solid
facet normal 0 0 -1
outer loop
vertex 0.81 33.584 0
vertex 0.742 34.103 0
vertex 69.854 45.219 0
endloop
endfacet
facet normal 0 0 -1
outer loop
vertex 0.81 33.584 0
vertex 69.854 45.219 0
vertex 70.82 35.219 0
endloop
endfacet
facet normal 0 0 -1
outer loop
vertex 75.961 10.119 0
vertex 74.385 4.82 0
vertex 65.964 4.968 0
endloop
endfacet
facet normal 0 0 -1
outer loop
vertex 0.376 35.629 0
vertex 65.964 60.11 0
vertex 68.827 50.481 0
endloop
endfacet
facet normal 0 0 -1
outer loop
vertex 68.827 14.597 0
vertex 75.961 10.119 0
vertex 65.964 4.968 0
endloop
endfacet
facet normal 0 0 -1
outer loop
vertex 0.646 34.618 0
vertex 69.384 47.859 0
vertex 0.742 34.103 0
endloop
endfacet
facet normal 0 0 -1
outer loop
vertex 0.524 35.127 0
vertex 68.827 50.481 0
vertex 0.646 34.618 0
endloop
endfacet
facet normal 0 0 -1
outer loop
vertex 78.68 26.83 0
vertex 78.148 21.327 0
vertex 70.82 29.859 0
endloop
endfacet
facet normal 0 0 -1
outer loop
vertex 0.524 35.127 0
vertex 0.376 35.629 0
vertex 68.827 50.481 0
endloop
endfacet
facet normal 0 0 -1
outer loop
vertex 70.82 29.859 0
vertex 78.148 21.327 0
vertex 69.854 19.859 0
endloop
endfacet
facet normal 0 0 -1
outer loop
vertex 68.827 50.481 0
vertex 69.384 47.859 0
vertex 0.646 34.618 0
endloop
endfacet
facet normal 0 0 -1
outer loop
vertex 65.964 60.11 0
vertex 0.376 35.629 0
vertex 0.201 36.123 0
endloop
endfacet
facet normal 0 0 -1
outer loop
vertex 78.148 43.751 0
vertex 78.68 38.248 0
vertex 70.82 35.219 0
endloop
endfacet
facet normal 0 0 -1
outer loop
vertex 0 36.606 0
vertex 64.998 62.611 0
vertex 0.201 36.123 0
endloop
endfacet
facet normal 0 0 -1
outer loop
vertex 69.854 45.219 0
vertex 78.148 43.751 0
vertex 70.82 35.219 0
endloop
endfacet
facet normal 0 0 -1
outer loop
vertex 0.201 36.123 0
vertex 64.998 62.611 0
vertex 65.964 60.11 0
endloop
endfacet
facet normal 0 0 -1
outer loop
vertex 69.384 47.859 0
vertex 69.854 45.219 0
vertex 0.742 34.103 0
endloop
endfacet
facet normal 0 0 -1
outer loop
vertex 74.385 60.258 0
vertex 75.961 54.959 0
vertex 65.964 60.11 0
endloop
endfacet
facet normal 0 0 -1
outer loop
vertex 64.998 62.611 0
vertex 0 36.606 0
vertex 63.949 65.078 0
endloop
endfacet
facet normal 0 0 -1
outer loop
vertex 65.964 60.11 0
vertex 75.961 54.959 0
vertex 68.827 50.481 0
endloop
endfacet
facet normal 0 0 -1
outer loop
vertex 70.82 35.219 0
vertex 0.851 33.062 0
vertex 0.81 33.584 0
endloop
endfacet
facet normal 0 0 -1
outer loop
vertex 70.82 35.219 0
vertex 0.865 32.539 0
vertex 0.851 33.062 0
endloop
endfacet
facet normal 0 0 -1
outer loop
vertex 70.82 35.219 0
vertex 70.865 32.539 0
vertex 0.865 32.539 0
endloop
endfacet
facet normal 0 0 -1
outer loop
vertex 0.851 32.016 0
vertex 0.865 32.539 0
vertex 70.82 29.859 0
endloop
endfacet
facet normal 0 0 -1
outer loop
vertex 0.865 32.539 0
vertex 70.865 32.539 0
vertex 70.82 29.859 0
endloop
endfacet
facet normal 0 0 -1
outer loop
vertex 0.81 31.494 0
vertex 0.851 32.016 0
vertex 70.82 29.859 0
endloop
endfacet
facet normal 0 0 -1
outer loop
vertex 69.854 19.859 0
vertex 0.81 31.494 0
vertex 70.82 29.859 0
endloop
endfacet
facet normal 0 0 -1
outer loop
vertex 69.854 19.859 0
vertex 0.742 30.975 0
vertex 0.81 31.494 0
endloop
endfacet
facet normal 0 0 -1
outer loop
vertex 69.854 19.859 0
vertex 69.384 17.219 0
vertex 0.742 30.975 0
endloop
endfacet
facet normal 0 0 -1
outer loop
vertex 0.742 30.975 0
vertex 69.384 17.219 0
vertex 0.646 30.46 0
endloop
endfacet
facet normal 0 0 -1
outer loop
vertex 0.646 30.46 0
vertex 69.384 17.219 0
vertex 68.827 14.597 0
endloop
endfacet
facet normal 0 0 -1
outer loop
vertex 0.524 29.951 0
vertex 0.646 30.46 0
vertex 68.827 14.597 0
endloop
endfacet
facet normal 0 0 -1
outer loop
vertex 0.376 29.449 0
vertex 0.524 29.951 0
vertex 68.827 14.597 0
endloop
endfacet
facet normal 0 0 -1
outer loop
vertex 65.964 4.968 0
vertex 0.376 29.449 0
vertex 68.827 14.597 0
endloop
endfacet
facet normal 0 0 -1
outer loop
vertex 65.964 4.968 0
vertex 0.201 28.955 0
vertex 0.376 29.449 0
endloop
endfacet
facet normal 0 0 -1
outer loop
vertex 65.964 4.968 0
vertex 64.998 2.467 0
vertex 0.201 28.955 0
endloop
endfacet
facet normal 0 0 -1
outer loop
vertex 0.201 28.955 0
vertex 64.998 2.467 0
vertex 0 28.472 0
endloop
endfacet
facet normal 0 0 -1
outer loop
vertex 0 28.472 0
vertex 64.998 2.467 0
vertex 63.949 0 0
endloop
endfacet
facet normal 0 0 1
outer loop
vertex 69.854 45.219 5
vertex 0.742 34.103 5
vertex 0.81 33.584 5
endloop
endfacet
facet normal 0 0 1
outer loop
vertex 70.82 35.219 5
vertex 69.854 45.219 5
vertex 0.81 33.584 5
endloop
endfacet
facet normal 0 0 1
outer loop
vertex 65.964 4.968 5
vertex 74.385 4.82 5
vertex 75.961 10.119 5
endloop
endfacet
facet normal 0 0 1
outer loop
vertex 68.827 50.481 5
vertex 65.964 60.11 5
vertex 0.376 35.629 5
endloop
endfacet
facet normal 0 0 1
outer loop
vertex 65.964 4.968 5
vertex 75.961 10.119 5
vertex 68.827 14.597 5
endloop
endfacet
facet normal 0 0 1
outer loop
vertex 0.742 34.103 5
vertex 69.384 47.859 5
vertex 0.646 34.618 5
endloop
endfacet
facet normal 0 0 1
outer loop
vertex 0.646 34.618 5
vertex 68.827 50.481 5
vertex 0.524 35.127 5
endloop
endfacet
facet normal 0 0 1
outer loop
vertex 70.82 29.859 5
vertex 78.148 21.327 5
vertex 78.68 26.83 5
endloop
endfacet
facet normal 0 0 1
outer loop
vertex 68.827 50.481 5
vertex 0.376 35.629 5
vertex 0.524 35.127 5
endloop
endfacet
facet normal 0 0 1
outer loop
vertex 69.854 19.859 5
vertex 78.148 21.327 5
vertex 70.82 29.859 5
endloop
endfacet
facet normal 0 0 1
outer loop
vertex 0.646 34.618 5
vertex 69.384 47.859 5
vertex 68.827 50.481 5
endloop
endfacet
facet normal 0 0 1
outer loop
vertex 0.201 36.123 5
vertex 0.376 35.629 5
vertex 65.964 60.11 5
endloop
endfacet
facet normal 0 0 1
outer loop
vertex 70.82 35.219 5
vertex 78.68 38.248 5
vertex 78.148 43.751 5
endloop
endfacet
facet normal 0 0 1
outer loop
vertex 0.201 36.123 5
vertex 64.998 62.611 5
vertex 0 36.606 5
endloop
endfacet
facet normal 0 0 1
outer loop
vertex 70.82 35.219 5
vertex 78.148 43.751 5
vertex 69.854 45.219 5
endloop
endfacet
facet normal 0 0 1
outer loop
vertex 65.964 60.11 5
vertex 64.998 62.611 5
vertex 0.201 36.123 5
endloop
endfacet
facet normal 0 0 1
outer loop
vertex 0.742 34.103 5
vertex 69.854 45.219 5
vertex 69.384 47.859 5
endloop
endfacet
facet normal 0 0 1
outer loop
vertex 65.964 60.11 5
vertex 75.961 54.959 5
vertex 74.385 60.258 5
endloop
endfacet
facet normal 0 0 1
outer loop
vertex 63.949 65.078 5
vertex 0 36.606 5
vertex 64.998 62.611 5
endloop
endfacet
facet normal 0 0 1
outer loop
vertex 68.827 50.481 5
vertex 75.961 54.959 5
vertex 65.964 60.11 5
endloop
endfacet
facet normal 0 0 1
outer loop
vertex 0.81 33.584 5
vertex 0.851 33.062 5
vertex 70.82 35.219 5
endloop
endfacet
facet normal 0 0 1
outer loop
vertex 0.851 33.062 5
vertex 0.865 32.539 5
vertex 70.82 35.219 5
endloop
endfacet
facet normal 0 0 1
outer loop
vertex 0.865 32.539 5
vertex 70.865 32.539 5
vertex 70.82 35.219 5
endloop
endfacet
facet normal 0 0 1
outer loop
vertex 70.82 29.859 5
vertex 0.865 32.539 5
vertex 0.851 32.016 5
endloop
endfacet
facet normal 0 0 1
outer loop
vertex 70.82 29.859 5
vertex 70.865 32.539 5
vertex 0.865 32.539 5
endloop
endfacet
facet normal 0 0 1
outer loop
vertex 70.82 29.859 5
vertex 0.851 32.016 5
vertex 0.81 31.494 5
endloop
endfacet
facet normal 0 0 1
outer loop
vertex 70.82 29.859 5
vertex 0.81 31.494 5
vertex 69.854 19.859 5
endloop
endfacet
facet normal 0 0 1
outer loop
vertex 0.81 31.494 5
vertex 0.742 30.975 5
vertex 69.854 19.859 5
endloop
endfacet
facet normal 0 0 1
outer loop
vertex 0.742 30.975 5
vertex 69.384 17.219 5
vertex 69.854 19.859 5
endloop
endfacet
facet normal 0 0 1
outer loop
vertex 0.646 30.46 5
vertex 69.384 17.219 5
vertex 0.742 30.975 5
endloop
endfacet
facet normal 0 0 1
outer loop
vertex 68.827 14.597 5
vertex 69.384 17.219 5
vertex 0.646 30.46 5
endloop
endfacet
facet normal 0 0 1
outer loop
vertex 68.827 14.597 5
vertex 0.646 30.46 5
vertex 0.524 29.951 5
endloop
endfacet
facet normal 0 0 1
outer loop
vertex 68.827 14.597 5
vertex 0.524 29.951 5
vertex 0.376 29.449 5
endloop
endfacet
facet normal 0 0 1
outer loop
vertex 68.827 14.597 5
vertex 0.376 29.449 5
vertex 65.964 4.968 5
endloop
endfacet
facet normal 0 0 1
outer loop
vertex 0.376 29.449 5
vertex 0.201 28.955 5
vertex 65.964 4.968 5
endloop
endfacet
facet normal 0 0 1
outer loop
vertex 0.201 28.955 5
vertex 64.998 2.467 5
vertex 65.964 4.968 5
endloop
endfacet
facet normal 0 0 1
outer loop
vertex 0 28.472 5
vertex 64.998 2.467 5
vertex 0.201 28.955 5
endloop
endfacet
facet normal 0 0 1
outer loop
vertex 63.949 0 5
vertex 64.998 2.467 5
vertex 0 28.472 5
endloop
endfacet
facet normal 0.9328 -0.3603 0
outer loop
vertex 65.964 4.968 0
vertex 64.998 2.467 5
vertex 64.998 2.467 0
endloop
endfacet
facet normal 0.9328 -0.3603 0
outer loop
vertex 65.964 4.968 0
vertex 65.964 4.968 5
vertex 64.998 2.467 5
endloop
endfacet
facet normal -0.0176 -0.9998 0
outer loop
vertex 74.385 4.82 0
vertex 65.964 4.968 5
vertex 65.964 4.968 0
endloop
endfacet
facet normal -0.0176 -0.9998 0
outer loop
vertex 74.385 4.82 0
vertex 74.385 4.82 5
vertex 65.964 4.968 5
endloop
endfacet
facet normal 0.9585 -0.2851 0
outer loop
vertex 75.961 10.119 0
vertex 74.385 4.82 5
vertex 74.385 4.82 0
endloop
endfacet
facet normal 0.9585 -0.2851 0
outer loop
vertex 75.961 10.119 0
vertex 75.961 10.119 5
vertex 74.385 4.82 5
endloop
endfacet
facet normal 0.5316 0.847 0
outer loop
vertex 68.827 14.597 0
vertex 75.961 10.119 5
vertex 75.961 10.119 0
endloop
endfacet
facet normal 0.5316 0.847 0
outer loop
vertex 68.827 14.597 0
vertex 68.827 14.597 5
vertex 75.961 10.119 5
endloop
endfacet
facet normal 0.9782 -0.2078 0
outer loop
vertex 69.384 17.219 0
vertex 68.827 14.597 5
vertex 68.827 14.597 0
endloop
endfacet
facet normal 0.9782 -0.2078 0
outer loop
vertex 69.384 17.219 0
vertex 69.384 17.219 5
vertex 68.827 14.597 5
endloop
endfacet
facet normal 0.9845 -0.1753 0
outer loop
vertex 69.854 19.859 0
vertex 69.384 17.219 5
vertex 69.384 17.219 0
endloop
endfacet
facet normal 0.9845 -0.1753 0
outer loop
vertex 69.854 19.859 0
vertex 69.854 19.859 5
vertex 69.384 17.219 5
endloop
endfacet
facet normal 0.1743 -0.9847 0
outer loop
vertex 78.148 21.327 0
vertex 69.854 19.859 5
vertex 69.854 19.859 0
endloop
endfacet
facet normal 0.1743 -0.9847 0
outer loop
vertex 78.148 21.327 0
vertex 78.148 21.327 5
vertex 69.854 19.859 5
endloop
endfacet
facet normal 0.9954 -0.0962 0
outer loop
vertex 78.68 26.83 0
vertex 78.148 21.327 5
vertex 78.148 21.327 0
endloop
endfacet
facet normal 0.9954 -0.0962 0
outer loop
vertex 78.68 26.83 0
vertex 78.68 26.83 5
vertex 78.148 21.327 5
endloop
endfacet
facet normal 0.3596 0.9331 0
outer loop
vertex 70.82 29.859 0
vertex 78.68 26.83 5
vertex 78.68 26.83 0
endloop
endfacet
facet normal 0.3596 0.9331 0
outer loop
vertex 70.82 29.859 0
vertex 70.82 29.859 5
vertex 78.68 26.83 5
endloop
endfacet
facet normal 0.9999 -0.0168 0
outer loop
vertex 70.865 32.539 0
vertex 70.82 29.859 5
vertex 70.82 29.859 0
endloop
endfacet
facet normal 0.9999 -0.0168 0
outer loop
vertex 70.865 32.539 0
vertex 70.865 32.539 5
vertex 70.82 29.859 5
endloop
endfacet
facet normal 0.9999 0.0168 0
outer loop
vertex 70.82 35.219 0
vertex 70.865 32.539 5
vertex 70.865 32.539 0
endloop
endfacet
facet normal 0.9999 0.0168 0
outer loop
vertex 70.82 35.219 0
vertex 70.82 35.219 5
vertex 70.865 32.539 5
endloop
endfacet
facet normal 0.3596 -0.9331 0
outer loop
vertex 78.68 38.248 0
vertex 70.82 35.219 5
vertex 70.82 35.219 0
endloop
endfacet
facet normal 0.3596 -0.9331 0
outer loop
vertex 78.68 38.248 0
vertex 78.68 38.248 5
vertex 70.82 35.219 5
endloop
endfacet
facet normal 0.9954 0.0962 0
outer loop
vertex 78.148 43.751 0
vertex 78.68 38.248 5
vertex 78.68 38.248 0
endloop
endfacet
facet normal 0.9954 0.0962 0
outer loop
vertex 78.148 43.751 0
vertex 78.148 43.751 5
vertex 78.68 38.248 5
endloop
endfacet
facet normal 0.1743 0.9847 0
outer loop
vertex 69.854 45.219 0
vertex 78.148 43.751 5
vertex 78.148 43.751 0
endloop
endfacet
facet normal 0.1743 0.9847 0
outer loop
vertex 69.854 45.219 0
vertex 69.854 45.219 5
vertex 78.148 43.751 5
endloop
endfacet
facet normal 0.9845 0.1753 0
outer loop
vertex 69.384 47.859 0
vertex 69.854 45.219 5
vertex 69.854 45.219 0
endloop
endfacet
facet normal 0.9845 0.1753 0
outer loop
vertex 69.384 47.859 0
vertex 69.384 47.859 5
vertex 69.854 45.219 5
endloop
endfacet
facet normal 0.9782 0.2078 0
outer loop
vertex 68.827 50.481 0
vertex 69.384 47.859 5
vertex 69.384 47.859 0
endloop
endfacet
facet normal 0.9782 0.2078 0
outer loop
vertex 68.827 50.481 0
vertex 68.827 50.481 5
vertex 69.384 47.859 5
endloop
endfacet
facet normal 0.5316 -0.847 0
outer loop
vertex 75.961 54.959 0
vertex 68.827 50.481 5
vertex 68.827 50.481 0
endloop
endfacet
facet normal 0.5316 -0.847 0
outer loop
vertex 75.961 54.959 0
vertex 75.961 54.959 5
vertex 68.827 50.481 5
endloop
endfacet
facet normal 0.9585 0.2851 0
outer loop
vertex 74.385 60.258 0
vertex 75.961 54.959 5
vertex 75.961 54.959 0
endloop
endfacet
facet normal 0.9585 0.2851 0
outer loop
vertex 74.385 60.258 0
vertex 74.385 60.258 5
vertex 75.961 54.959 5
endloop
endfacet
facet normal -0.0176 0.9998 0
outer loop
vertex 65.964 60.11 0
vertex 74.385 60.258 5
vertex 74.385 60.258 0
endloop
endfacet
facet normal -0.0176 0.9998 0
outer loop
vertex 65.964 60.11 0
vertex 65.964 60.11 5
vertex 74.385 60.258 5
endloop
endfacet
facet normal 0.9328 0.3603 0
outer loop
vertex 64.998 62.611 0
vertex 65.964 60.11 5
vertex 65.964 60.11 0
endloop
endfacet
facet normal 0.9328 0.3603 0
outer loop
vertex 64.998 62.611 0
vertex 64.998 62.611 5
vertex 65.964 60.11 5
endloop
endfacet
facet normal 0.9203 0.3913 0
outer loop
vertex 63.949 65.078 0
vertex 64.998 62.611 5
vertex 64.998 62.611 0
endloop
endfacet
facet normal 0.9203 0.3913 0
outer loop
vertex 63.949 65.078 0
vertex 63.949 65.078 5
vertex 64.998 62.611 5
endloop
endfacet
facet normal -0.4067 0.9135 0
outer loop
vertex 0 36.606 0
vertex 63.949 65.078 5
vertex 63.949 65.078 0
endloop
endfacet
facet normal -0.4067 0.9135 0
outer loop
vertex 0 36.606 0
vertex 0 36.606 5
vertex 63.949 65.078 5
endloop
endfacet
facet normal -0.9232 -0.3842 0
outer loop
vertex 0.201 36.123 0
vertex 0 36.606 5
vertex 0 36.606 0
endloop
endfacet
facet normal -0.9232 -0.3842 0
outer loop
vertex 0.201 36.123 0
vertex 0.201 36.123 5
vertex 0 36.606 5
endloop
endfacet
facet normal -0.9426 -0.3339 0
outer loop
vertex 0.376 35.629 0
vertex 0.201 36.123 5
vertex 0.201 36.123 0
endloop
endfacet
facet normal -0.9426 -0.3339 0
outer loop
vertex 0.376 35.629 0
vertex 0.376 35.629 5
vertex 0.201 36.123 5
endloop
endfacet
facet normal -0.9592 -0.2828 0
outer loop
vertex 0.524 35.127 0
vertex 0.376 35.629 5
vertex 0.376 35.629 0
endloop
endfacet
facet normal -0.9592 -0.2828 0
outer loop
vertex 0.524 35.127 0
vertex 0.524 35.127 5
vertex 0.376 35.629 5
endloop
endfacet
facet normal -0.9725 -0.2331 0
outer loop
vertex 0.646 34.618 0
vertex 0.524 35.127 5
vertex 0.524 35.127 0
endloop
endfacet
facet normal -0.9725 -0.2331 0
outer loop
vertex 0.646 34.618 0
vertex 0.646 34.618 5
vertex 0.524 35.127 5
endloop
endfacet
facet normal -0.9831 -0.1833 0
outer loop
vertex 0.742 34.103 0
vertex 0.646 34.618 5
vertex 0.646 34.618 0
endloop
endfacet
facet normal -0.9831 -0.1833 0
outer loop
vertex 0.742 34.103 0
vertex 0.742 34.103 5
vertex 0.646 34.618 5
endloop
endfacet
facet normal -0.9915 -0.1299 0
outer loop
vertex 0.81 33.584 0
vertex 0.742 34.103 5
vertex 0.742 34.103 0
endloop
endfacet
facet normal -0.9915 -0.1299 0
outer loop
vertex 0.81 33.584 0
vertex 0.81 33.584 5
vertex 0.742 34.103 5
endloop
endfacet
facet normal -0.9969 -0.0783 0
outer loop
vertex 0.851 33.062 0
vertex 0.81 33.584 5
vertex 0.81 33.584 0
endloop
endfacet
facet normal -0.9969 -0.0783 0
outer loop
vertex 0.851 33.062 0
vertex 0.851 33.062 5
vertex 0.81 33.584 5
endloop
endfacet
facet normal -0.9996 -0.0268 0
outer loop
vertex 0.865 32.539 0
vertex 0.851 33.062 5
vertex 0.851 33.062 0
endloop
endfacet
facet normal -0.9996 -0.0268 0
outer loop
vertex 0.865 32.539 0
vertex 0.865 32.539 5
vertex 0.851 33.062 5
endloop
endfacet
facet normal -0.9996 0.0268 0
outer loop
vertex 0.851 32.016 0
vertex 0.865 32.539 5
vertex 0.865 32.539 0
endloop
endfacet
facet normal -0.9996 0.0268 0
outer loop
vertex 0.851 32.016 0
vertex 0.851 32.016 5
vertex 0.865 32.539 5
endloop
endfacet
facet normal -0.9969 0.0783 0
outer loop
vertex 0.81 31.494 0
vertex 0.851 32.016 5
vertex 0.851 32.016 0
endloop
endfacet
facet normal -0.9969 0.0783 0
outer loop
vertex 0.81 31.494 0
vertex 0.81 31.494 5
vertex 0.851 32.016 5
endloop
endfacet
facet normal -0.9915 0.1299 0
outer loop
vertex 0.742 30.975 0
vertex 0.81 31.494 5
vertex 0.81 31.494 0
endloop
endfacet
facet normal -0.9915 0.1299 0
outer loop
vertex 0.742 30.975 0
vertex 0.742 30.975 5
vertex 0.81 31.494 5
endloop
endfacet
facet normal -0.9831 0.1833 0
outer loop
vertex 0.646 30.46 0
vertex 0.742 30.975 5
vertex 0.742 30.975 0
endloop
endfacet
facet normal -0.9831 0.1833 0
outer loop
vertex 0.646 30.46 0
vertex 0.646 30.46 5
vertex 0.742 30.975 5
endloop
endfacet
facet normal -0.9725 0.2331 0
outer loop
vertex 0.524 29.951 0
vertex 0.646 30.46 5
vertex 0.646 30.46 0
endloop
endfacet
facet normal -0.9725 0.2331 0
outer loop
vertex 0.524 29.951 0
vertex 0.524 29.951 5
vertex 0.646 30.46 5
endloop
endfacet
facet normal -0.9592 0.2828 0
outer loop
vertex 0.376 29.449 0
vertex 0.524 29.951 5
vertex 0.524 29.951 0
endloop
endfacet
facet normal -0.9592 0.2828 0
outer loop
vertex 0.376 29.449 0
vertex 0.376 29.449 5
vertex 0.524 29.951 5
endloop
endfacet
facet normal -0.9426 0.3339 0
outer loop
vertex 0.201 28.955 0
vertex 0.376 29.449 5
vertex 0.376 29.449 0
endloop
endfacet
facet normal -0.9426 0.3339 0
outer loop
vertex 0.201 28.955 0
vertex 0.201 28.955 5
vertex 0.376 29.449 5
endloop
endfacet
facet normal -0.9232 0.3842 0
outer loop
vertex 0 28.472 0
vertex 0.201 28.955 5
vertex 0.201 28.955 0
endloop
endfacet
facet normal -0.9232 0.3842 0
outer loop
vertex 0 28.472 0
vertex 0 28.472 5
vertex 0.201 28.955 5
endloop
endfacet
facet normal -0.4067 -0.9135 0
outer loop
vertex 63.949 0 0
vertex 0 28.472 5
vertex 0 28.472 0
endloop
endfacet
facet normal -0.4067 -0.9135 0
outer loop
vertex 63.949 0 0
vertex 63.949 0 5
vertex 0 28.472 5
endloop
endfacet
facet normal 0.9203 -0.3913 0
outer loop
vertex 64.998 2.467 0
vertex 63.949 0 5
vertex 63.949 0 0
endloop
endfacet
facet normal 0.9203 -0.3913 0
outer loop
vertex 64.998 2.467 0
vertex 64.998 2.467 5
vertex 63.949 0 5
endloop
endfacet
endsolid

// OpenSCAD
$fn = 32;

// ----------------------------------------------------------------------
// Gear sector: 4 teeth on 48 degrees
// ----------------------------------------------------------------------

// --- parameters (mm) ---
sector_angle = 48;        // sector angle, degrees
root_r = 80;              // root circle radius
tooth_h = 8;              // tooth height over the root circle
teeth = 4;                // number of teeth on the sector
hub_r = 10;               // hub bore radius
plate_t = 5;              // sector thickness, Z
arc_step = 3;             // sampling step of the root/hub arcs, degrees

tip_r = root_r + tooth_h;  // tip circle radius

profile = [[63.949, 0], [64.998, 2.467], [65.964, 4.968], [74.385, 4.82], [75.961, 10.119], [68.827, 14.597], [69.384, 17.219], [69.854, 19.859], [78.148, 21.327], [78.68, 26.83], [70.82, 29.859], [70.865, 32.539], [70.82, 35.219], [78.68, 38.248], [78.148, 43.751], [69.854, 45.219], [69.384, 47.859], [68.827, 50.481], [75.961, 54.959], [74.385, 60.258], [65.964, 60.11], [64.998, 62.611], [63.949, 65.078], [0, 36.606], [0.201, 36.123], [0.376, 35.629], [0.524, 35.127], [0.646, 34.618], [0.742, 34.103], [0.81, 33.584], [0.851, 33.062], [0.865, 32.539], [0.851, 32.016], [0.81, 31.494], [0.742, 30.975], [0.646, 30.46], [0.524, 29.951], [0.376, 29.449], [0.201, 28.955], [0, 28.472]];  // primary outline, 40 points, counter clockwise

// --- the one profile operation ---
linear_extrude(height = plate_t) polygon(points = profile);
